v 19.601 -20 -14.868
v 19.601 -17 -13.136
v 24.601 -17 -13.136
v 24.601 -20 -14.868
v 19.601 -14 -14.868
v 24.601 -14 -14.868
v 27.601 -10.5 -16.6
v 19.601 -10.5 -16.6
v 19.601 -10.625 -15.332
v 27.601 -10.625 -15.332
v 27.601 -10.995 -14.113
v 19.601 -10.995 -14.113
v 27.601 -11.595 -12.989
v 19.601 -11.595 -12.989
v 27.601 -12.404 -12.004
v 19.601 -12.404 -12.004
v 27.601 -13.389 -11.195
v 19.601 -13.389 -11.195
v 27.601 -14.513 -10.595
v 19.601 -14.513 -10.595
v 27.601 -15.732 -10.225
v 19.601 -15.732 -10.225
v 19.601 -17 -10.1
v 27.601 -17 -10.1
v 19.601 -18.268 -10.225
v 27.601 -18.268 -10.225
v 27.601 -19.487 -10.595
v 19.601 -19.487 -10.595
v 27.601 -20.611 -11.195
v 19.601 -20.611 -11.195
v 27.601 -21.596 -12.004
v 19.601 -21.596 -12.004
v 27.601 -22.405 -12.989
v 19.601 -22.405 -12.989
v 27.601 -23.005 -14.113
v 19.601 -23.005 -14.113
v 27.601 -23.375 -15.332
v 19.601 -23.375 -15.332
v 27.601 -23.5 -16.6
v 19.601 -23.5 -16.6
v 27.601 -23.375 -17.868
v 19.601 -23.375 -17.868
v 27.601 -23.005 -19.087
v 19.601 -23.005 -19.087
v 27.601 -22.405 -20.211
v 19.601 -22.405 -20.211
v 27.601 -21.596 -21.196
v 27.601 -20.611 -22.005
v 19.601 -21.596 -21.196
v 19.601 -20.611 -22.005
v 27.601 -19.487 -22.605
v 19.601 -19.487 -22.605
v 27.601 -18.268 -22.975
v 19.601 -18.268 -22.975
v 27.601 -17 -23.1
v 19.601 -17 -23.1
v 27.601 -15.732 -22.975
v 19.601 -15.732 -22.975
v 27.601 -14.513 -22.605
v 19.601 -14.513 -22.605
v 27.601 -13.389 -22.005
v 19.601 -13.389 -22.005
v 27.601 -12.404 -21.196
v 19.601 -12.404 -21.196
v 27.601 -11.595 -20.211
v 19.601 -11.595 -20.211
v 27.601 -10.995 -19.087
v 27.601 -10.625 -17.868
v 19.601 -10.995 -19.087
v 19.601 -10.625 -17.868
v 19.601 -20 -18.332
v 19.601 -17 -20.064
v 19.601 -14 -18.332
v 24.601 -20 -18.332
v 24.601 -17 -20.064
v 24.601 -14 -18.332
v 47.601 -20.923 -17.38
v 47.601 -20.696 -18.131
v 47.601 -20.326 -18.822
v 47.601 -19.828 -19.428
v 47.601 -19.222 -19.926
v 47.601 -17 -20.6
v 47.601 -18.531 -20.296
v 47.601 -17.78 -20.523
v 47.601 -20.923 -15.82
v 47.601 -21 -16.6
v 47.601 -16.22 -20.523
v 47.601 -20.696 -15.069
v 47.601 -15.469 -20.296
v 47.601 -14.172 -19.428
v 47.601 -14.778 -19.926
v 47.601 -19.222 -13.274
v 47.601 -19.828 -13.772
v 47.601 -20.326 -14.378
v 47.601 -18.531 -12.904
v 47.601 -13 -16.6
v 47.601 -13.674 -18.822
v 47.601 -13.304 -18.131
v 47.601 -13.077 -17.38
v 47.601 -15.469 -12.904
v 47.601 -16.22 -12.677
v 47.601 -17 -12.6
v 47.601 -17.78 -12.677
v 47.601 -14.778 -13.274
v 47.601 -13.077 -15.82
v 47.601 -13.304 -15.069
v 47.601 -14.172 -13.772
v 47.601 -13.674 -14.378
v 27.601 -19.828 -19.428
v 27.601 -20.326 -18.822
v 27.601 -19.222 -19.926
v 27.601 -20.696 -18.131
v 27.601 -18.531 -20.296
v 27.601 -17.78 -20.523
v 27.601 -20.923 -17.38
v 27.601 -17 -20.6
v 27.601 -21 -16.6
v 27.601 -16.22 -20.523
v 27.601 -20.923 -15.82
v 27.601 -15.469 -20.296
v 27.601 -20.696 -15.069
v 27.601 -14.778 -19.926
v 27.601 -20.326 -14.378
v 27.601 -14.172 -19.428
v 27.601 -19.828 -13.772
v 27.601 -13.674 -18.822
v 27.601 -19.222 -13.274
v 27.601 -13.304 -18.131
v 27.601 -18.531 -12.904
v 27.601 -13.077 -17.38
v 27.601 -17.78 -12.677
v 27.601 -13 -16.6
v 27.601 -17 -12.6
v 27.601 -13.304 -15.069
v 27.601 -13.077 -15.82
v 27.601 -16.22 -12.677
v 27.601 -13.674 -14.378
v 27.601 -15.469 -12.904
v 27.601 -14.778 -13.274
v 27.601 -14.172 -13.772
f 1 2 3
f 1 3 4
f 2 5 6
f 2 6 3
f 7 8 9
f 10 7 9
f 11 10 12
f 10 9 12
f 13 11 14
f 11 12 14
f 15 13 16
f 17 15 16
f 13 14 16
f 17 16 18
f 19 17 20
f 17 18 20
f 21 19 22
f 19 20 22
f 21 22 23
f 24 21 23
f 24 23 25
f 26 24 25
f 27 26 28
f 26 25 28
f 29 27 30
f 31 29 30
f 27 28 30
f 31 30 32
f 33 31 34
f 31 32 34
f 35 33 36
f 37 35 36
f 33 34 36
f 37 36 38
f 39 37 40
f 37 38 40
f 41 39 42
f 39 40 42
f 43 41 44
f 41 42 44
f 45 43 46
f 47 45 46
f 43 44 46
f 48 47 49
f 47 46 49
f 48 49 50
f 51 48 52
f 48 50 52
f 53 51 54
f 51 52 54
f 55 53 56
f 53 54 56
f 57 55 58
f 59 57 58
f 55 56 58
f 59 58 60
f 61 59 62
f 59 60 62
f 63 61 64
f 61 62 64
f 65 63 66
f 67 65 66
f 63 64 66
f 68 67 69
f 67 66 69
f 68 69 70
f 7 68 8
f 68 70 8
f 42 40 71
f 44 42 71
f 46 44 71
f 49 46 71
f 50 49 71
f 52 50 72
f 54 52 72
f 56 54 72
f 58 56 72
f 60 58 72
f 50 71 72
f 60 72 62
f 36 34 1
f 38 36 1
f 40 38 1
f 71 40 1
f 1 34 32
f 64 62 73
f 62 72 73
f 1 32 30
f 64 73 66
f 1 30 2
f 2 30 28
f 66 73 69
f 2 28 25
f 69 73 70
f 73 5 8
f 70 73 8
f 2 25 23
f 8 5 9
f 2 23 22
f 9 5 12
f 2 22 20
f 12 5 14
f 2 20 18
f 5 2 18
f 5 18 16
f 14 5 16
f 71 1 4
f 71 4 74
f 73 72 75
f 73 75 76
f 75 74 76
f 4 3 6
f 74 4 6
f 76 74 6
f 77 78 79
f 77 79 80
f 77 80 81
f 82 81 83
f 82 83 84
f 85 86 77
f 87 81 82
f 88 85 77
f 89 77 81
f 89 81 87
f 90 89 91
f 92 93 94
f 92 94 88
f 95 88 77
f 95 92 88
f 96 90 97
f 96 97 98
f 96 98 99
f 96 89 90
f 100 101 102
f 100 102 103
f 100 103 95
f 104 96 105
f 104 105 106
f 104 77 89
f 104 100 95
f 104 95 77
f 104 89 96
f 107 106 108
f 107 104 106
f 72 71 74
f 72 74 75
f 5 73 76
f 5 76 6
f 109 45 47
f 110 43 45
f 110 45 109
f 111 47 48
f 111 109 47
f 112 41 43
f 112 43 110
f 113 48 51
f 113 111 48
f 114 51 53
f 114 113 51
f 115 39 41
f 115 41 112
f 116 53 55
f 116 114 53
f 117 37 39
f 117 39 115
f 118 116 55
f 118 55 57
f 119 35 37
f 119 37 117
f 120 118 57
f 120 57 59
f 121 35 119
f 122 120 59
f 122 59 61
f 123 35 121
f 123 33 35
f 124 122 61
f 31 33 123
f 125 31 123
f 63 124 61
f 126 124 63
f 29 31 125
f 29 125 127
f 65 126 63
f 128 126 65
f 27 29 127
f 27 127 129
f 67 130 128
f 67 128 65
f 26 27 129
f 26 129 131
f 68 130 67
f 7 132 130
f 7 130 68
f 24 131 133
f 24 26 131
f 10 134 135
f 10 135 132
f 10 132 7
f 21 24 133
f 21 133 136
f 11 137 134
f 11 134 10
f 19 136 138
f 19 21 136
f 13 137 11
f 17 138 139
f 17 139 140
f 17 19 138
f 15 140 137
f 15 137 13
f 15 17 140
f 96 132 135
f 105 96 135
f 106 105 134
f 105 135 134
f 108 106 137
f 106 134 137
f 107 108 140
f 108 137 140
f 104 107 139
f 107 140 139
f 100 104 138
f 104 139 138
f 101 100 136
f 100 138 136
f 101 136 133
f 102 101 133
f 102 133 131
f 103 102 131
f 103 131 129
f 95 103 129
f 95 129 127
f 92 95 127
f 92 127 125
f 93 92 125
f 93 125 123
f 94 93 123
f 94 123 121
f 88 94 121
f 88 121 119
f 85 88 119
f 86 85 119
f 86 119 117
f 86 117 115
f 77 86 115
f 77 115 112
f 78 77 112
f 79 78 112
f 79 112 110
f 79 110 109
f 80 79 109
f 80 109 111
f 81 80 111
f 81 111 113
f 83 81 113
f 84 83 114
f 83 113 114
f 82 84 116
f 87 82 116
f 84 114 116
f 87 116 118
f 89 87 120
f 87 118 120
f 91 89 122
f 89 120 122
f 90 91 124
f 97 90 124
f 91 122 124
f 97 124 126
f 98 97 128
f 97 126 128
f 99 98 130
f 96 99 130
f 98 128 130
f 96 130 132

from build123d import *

# Parameters (mm, degrees)
SKETCH091_R     = 4
PAD034_DEPTH    = 28
SKETCH092_R     = 6.5
PAD035_DEPTH    = 8
POCKET034_DEPTH = 5


with BuildPart() as part:
    # Sketch091 → Pad034 (new body)
    with BuildSketch(Plane.YZ):
        Circle(SKETCH091_R)
    extrude(amount=PAD034_DEPTH)

    # Sketch092 → Pad035 (join)
    with BuildSketch(Plane.YZ):
        Circle(SKETCH092_R)
    extrude(amount=PAD035_DEPTH)

    # Sketch093 → Pocket034 (cut)
    with BuildSketch(Plane.YZ):
        Polygon((3, 1.732051), (0, 3.464102), (-3, 1.732051), (-3, -1.732051), (0, -3.464102), (3, -1.732051), align=None)
    extrude(amount=POCKET034_DEPTH, mode=Mode.SUBTRACT)


with BuildPart() as part_1:
    # Body020 placement: moved
    add(part.part.moved(Location((19.600528, -17, -16.6))))


solid = part_1.part
